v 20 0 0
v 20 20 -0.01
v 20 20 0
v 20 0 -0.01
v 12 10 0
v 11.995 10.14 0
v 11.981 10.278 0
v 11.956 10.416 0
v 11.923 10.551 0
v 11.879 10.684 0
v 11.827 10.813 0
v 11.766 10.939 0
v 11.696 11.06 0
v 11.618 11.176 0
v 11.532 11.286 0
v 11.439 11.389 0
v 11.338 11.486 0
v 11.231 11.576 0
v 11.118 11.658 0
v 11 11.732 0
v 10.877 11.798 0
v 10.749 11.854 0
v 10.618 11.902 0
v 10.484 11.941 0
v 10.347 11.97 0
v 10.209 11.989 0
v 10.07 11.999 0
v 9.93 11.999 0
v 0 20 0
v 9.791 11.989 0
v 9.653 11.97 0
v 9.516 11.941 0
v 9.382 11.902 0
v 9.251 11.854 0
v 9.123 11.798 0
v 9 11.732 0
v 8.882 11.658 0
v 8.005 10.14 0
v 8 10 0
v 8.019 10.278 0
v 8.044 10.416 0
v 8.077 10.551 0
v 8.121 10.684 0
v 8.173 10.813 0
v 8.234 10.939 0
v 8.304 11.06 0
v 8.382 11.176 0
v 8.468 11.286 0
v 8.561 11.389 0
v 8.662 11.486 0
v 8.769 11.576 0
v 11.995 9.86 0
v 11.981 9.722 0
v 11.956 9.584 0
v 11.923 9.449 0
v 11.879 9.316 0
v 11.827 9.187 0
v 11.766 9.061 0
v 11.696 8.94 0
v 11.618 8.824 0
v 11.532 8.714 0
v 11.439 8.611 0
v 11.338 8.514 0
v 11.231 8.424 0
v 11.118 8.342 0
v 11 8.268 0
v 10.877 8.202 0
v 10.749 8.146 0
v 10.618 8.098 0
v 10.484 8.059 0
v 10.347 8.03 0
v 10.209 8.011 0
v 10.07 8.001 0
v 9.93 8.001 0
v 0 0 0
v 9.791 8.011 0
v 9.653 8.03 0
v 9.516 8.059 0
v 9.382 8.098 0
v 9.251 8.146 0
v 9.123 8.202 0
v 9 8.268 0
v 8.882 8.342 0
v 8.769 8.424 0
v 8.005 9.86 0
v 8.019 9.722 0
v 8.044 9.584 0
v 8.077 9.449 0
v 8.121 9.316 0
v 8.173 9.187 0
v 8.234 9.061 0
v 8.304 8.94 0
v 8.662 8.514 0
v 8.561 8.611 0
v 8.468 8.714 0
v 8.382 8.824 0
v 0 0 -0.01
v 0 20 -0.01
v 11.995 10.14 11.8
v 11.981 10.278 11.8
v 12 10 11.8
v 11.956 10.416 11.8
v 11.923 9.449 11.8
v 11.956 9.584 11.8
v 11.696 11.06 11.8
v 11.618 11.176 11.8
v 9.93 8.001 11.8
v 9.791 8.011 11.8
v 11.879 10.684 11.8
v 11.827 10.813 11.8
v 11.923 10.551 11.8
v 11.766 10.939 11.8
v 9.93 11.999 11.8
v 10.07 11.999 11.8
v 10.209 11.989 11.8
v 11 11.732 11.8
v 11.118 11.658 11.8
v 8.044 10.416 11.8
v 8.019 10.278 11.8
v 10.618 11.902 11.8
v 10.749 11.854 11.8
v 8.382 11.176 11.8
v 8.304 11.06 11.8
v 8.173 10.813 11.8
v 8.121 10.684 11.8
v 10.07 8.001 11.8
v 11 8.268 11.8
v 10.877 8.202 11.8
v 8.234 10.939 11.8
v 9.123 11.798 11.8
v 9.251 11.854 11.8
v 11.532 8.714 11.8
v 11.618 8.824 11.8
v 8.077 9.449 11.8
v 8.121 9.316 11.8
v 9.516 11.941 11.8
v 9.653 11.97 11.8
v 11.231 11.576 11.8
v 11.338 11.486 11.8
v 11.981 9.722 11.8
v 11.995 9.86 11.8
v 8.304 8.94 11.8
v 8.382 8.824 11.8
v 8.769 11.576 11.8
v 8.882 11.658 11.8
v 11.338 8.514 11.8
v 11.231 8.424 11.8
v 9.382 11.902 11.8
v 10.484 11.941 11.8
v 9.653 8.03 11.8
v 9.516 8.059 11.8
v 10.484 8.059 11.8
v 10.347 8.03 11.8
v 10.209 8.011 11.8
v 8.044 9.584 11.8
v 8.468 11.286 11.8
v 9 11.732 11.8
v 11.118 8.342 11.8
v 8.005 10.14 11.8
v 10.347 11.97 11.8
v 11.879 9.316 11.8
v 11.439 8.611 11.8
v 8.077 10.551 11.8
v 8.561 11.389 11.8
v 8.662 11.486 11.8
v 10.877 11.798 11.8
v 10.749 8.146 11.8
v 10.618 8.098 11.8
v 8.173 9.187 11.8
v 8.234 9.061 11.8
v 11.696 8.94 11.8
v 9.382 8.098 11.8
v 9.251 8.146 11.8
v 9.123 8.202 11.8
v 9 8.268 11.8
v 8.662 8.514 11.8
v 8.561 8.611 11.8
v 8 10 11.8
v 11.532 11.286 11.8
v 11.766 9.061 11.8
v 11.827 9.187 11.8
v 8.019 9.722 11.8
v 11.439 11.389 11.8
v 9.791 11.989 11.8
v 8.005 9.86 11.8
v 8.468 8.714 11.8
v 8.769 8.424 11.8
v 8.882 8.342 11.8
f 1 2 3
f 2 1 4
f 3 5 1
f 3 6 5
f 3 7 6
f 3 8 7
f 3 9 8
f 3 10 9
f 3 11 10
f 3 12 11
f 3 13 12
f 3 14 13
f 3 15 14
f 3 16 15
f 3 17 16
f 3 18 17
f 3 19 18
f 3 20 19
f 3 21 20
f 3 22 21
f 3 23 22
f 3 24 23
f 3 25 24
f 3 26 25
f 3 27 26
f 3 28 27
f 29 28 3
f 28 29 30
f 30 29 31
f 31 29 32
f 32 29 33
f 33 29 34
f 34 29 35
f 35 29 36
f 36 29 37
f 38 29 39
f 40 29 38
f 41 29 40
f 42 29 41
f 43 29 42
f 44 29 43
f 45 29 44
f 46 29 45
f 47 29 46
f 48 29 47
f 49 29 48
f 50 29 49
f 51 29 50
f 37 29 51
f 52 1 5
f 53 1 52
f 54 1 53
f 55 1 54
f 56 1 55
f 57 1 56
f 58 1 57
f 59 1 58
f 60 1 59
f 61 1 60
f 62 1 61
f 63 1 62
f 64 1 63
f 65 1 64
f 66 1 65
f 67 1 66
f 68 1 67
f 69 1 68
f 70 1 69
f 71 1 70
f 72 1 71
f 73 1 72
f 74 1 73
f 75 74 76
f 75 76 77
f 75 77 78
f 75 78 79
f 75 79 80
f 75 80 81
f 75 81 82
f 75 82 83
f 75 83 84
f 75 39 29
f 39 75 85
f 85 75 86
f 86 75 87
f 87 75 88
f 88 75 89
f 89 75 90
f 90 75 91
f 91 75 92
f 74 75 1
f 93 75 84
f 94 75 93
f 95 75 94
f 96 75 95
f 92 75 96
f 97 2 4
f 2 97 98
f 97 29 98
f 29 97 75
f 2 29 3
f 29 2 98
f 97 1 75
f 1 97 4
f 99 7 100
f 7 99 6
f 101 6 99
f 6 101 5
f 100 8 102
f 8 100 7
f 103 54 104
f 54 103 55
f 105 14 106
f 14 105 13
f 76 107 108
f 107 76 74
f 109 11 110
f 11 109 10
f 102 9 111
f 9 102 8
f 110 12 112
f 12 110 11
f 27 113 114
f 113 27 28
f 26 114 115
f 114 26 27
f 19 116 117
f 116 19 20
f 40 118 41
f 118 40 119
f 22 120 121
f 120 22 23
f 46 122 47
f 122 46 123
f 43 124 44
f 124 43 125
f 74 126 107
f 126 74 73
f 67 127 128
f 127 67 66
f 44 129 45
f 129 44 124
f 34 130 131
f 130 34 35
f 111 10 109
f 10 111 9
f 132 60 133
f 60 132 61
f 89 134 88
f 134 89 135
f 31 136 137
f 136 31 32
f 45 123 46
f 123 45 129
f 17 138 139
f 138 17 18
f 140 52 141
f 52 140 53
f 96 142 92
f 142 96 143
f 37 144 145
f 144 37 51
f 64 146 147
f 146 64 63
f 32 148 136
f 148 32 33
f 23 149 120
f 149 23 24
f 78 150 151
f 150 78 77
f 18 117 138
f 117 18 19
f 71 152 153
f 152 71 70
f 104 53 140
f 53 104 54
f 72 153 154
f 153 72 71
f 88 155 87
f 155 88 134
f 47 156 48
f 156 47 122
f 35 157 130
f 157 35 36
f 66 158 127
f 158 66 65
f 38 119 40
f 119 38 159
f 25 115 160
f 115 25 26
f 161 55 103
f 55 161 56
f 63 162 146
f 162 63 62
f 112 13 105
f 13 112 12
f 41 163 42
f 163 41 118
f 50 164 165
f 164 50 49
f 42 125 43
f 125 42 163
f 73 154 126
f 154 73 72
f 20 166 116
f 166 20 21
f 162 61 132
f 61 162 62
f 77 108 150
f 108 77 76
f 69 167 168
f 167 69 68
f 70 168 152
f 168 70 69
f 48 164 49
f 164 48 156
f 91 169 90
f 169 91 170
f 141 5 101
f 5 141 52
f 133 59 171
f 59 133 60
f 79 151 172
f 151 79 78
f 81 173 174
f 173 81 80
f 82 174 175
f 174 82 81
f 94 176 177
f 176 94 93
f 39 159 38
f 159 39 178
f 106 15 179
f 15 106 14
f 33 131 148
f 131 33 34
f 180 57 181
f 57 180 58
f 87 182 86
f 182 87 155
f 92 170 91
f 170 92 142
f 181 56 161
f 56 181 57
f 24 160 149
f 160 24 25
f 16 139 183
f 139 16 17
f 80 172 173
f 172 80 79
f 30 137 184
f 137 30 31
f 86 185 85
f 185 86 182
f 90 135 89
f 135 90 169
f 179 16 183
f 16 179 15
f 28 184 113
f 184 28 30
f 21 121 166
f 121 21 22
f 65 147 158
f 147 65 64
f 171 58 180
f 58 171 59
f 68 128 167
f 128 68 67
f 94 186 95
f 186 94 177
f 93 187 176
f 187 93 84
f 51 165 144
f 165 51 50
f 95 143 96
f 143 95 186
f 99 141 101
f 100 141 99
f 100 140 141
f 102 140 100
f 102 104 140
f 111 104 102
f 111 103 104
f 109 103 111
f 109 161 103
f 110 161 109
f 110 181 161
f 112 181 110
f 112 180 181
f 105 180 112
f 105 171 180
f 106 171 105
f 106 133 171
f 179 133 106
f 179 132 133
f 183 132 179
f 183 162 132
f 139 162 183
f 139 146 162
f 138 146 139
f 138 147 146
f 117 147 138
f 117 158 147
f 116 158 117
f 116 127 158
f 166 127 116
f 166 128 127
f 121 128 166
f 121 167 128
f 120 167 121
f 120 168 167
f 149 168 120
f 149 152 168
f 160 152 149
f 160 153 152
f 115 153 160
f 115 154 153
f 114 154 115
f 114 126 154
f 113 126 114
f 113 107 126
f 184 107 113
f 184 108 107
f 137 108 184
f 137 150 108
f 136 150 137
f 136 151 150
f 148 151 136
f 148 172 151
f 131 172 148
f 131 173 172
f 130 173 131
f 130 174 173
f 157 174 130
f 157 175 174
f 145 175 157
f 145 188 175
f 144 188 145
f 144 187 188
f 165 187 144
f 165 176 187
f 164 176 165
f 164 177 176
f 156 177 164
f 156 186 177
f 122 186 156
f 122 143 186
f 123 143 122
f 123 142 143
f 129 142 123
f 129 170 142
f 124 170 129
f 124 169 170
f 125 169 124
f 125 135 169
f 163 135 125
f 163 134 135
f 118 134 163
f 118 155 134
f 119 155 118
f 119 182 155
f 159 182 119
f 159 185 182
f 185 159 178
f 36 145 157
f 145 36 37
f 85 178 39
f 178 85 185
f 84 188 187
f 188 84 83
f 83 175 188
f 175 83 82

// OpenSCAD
// file: ../Base/Boxes.scad
// Fischertechnik Box Foundation
// Pre-designed Boxes

use <Constants.scad>

include <PlacementOptions.scad>

box190Width = 190;
box190Depth = 130;
box130Width = 130;
box130Depth = 95;
boxUsageHeight = 33.9;
boxWallThickness = 2.4;
boxBaseThickness = 1.0;

// getBoxWallThickness()
// Gets the wall thickness of a Fischertechnik Box

function getBoxWallThickness() = boxWallThickness;

// Gets the usable height of a fischertechnik box
function getBoxUsageHeight() = boxUsageHeight;

// Gets the thickness of the Fischertechnik box base.
function getBoxBaseThickness() = boxBaseThickness;

// Gets the usable inner space of a Box 190 as an x/y-list
function getBox190Space() = [
    box190Width - 2*getBoxWallThickness(), 
    box190Depth - 2*getBoxWallThickness() ];

// Imports the Fischertechnik empty box 130x190 mm and places it at position 0,0
// 190x130 are the outer sizes, the inner space is slightly smaller. Use getBox190Space() to get the inner sizes.
// This module needs the STL file "Fischertechnik Box 130x190.stl" in the library path.
// The box is positioned that the usable inner space is at the 0,0,0 position. The

module Box190() {
    translate([-getBoxWallThickness(),-getBoxWallThickness(),-getBoxBaseThickness()])
        import("Fischertechnik Box 130x190.stl", convexity=3);
}

// Gets the usable inner space of a Box 130 as an x/y-list
function getBox130Space() = [
    box130Width - 2*getBoxWallThickness(), 
    box130Depth - 2*getBoxWallThickness() ];

// Imports the Fischertechnik empty box 95x130 mm and places it at position 0,0
// 190x130 are the outer sizes, the inner space is slightly smaller. Use getBox190Space() to get the inner sizes.
// This module needs the STL file "Fischertechnik Box 95x130.stl" in the library path.
// The box is positioned that the usable inner space is at the 0,0,0 position. The

module Box130() {
    translate([-getBoxWallThickness(),-getBoxWallThickness(),-getBoxBaseThickness()])
        import("Fischertechnik Box 95x130.stl", convexity=3);
}

// Creates a web at the specified box walls
// corner 0 = LowerLeft, 1 = UpperLeft, 2 = UpperRight, 3 = LowerRight
// side 0 = LeftOfCorner, 1 = RightOfCorner
// distance = Distance in mm from the corner
// box = inner width and depth of the box (default: Box 190)
// webWidth = length of the web (default is 3 mms)
// webThickness = thickness of the web (default is 1 mm)

module BoxWeb(corner, side, distance, box=getBox190Space(), webWidth=3, webThickness=1.0) {
    sink = getBoxWallThickness()/2;

    width = (corner % 2 == 0) ? 
            (side == LeftOfCorner ? webWidth : webThickness) :
            (side == LeftOfCorner ? webThickness : webWidth);

    depth = (corner % 2 == 0) ? 
            (side == RightOfCorner ? webWidth : webThickness) :
            (side == RightOfCorner ? webThickness : webWidth);
    
    xDiff = corner == LowerLeft ? 
                (side == LeftOfCorner ? -sink : distance) :
            (corner == UpperLeft ?                
                (side == LeftOfCorner ? distance : -sink) :
            (corner == UpperRight ?
                (side == LeftOfCorner ? box.x-webWidth+sink : box.x-distance-webThickness) :
                (side == LeftOfCorner ? box.x-distance-webThickness: box.x-webWidth+sink)));

    yDiff = corner == LowerLeft ? 
                (side == RightOfCorner ? -sink : distance) :
            (corner == UpperLeft ?
                (side == RightOfCorner ? box.y-distance : box.y-webWidth+sink) :
            (corner == UpperRight ?
                (side == RightOfCorner ? box.y-webWidth+sink : box.y-distance) :
                (side == RightOfCorner ? distance : -sink)));
    
    translate([xDiff, yDiff, -getExcess()])
        cube([width, depth, boxUsageHeight + 2*getExcess()]);
}
// file: ../Base/Rotation.scad
// Fischertechnik Box Foundation
// Geometry Helpers Rotation

include <PlacementOptions.scad>

// getRotatedSpace(space, rotation=NoRotation)
// Rotates the space dependent on the specified rotation

function getRotatedSpace(space, rotation=NoRotation) = [
    (rotation == Rotate90 || rotation == Rotate270) ? space.y : space.x,
    (rotation == Rotate90 || rotation == Rotate270) ? space.x : space.y
];

// Rotates the given space around the fixed left lower corner
// space = the space the children needs as width/depth list [width,depth]
// rotation = 0 Rotate0 degrees, 1 Rotate90 degrees, 2 Rotate180 degrees, 3 Rotate270 degrees (equivalent to -90)

module RotateFix(space, rotation=Rotate0) {
    dy = (rotation == Rotate0 || rotation == Rotate270) ? 0 :
        (rotation == Rotate90) ? space.x :
        space.y;
    dx = (rotation < Rotate180) ? 0 :
        (rotation == Rotate180) ? space.x :
        space.y;
    
    translate([dx, dy, 0])
        rotate([0, 0, rotations[rotation]])
            children();
}
// file: ../Base/Alignment.scad
// Fischertechnik Box Foundation
// Geometry Helpers Alignment

include <PlacementOptions.scad>

// getAlignedX(elementWidth, spaceWidth, align=AlignRight, offset=0)
// Gets the aligned X offset of an element with the given
// width in the given space.
// elementWidth = The width of the element to positon
// spaceWidth = The space where the element should be aligned
// align = 0 AlignLeft, 1 AlignCenter, 2 AlignRight
// offset = an optional offset from the aligned position. When
// aligned left or centered, then positive values are in X direction.
// When aligned right then positive values are in negative X direction.

function getAlignedX(elementWidth, spaceWidth, align=AlignRight, offset=0) =
    (align == AlignLeft) ?
        offset :
        ((align == AlignCenter) ?
        (spaceWidth - elementWidth)/2 + offset :
        spaceWidth - offset - elementWidth);

// getAlignedY(elementDepth, spaceDepth, align=AlignTop, offset=0)
// Gets the aligned Y offset of an element with the given
// depth in the given space.
// elementDepth = The depth of the element to positon
// spaceDepth = The space where the element should be aligned
// align = 0 AlignBottom, 1 AlignCenter, 2 AlignTop
// offset = an optional offset from the aligned position. When
// aligned bottom or centered, then positive values are in Y direction.
// When aligned top then positive values are in negative Y direction.

function getAlignedY(elementDepth, spaceDepth, align=AlignTop, offset=0) =
    (align == AlignBottom) ?
        offset :
        ((align == AlignCenter) ?
        (spaceDepth - elementDepth)/2 + offset :
        spaceDepth - offset - elementDepth);
// file: ../Base/PlacementOptions.scad
// Fischertechnik Box Foundation
// Placement Options

// Alignment
NoAlign = 0;
AlignLeft = 1;
AlignBottom = 2;
AlignCenter = 3;
AlignRight = 4;
AlignTop = 5;

// Element rotation degree steps
rotations = [0, -90, -180, -270];

// Rotation
NoRotation = 0;
Rotate0 = 0;
Rotate90 = 1;
Rotate180 = 2;
Rotate270 = 3;

// Docking (seen from above)
NoDock = -1;
DockLeft = 0;
DockTop = 1;
DockRight = 2;
DockCorner = 2;
DockBottom = 3;

// Web corners
LowerLeft = 0;
UpperLeft = 1;
UpperRight = 2;
LowerRight = 3;

// Web position relative to corner
LeftOfCorner = 0;
RightOfCorner = 1;
// file: ../Base/Placement.scad
// Fischertechnik Box Foundation
// Geometry Helpers Placement

use <Constants.scad>
use <Alignment.scad>
use <Rotation.scad>
use <Boxes.scad>

include <PlacementOptions.scad>

// Place(x=0, y=0, elementSpace=[0,0], alignX=AlignLeft, alignY=AlignBottom, rotation=Rotate0, boxSpace=getBox190Space())
// Places the child at the specified position
// y = Y-Position. This is a relative position when an X aligment is specified.
// x = X-Position. This is a relative position when an Y aligment is specified.
// elementSpace = space of the element to be placed [x,y]
// alignX = -1=NoAlign, 0 AlignLeft, 1 AlignCenter, 3 AlignRight (elementSpace and boxSpace required!)
// alignY = -1=NoAlign, 2 AlignBottom, 1 AlignCenter, 4 AlignTop (elementSpace and boxSpace required!)
// rotation = 0 Rotate0 0 degrees, 1 Rotate90 90 degrees, 
// 2 Rotate180 180 degrees, 3 Rotate270 270 degrees (equivalent to -90)
// boxSpace = Inner space of the box where the placement occurs [x,y] - default is Box 190x130 inner space

module Place(x=0, y=0, elementSpace=[0,0], 
  alignX=AlignLeft, alignY=AlignBottom, 
  rotation=NoRotation, boxSpace=getBox190Space()) {

    module Position(x, y, space, rotation=Rotate0) {
        translate([x, y, 0])
            RotateFix(space, rotation)
                children(0);
    }

    space = getRotatedSpace(elementSpace, rotation);
    alignedX = getAlignedX(space.x, boxSpace.x, alignX, x);
    alignedY = getAlignedY(space.y, boxSpace.y, alignY, y);
    Position(alignedX, alignedY, elementSpace, rotation)
        children(0);
}

// Center(space=getBox130Space(), elementSpace=[0,0])
// space = Space where the children is centered. For cylinder use centered=true and no elementSpace.
// elementSpace = space of the element to be centered [x,y]

module Center(space=getBox190Space(), elementSpace=[0,0]) {
    translate([(space.x - elementSpace.x) / 2, (space.y - elementSpace.y) / 2])
        children(0);
}

// CenterHorizontal(width=0, y=0, offset=0, space=getBox130Space())
// space = Space where the children is centered. For cylinder use centered=true and no elementSpace.
// elementSpace = space of the element to be centered [x,y]

module CenterHorizontal(width=0, y=0, offset=0, space=getBox190Space()) {
    translate([(space.x - width) / 2 + offset, y])
        children(0);
}

// CenterVertical(depth=0, x=0, offset=0, space=getBox130Space())
// space = Space where the children is centered. For cylinder use centered=true and no elementSpace.
// elementSpace = space of the element to be centered [x,y]

module CenterVerticalal(depth=0, x=0, offset=0, space=getBox190Space()) {
    translate([x, (space.y - depth) / 2 + offset])
        children(0);
}
// file: ../Base/Constants.scad
// Fischertechnik Box Foundation
// Constants

// Constant values necessary for multiple elements

// Base constants
dividerThickness = 1.2;
excess = 0.01;
fragments = 90;
tolerance = 0.8;

// Gets the thickness of a divider 
function getDividerThickness() = dividerThickness;

// Gets the excess that is used to merge walls into each other
function getExcess() = excess;

// Gets amount of fragments of a cylinder
function getFragments() = fragments;

// Gets the inner tolerance of a frame to each side
function getTolerance() = tolerance;


// Fischertechnik specific constants
axisDiameter = 4;
axisBottomDiameter = axisDiameter + 1;
standardEdgeDistance = 2.5;
standardWebDistance = 11.5;
standardCornerLength = 15;
tubeWallFactor = 1.6;

// Gets axis diameter
function getAxisDiameter() = axisDiameter;

// Gets axis bottom diameter for thicker part at the bottom
function getAxisBottomDiameter() = axisBottomDiameter;

// gets the standard distance to the wall of the box for dockable frames with webs
function getStandardEdgeDistance() = standardEdgeDistance;

// gets the standard distance of each web to the corner of the dockable frame
function getStandardWebDistance() = standardWebDistance;

// gets the standard length of the corner walls of a dockable frame
function getStandardCornerLength() = standardCornerLength;

// gets the wall thickness of a tube.
function getTubeWallThickness() = tubeWallFactor * getDividerThickness();
// main file
// Fischertechnik Box Library
// Axis for Cog Wheel 10 and Bevel Gear Wheel
// 31047 and 31051

use <../Base/Constants.scad>
use <../ModelBase/Simple.scad>

space = 20;

// getAxisCogWheelSpace()
// Gets the space the winch drum holder needs as width (.x and .y as a list)

function getAxisCogWheelSpace() = [space, space];

// AxisCogWheel()
// Standing axis for a cog wheel 31047 or
// a bevel gear wheel 31051

module AxisCogWheel() {
    height = 11.8;
    AxisWithSpace(height, getAxisCogWheelSpace());
}

// Tests
color("lightgray")
AxisCogWheel();
